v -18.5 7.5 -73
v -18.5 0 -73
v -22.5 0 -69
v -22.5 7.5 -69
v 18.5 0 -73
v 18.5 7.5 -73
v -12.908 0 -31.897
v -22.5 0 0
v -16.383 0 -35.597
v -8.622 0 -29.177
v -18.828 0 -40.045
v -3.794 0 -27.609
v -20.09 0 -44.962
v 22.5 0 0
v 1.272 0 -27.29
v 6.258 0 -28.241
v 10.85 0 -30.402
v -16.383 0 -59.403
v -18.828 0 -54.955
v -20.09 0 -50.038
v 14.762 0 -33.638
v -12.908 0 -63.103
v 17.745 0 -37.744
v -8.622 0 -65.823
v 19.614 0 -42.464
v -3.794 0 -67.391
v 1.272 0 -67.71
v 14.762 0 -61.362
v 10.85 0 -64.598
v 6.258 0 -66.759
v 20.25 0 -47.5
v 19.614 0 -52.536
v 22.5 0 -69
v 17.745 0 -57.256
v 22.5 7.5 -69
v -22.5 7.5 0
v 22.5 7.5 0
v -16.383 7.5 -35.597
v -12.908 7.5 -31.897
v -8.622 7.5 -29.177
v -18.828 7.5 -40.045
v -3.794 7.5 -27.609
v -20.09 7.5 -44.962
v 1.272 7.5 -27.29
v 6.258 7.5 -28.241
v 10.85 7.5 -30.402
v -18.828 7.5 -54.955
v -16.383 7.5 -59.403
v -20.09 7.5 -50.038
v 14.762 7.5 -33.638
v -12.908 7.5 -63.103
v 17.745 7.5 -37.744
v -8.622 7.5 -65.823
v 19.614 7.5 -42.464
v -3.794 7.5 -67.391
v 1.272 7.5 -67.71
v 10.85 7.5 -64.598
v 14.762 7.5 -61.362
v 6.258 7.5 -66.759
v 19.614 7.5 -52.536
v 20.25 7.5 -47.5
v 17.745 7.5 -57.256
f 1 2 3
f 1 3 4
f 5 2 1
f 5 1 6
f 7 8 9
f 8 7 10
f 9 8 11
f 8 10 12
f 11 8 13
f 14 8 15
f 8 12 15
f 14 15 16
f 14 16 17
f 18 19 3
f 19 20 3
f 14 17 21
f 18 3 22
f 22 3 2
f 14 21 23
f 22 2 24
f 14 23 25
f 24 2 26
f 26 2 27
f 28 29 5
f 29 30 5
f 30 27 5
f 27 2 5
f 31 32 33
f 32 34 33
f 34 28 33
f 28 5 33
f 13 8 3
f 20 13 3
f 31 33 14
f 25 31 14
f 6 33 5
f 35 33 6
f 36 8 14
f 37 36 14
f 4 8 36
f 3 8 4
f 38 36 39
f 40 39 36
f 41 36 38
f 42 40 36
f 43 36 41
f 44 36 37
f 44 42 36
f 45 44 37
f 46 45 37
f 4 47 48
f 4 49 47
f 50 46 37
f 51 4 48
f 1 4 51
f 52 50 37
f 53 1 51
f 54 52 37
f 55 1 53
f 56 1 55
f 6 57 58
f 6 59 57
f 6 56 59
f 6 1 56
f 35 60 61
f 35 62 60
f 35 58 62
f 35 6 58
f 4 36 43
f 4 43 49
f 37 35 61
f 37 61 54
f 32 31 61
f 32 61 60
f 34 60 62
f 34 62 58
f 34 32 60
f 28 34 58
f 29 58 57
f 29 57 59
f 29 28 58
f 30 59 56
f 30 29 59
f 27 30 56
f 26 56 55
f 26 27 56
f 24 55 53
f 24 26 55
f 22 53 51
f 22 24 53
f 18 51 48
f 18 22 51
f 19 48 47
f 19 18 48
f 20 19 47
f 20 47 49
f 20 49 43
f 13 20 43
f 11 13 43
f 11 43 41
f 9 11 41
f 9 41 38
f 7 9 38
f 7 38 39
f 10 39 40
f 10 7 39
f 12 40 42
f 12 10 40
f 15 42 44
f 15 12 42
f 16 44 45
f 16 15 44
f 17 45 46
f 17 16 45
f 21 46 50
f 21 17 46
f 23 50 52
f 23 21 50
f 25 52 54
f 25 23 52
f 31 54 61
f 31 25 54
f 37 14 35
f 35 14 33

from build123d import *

# Parameters (mm, degrees)
SKETCH1_W           = 45
SKETCH1_H           = 73
SKETCH1_R           = 20.25
BOSS_EXTRUDE1_DEPTH = 7.5
CHAMFER1_SIZE       = 4


with BuildPart() as part:
    # Sketch1 → Boss-Extrude1 (new body)
    with BuildSketch(Plane(origin=(0, 0, 0), x_dir=(1, 0, 0), z_dir=(0, 1, 0))):
        with Locations((0, 36.5)):
            Rectangle(SKETCH1_W, SKETCH1_H)
        with Locations((0, 47.5)):
            Circle(SKETCH1_R, mode=Mode.SUBTRACT)
    extrude(amount=BOSS_EXTRUDE1_DEPTH)

    # Chamfer1
    chamfer1_edges = [part.edges().sort_by_distance(p)[0] for p in [
        (-22.5, 3.75, -73),
        (22.5, 3.75, -73),
    ]]
    chamfer(chamfer1_edges, length=CHAMFER1_SIZE)


solid = part.part
